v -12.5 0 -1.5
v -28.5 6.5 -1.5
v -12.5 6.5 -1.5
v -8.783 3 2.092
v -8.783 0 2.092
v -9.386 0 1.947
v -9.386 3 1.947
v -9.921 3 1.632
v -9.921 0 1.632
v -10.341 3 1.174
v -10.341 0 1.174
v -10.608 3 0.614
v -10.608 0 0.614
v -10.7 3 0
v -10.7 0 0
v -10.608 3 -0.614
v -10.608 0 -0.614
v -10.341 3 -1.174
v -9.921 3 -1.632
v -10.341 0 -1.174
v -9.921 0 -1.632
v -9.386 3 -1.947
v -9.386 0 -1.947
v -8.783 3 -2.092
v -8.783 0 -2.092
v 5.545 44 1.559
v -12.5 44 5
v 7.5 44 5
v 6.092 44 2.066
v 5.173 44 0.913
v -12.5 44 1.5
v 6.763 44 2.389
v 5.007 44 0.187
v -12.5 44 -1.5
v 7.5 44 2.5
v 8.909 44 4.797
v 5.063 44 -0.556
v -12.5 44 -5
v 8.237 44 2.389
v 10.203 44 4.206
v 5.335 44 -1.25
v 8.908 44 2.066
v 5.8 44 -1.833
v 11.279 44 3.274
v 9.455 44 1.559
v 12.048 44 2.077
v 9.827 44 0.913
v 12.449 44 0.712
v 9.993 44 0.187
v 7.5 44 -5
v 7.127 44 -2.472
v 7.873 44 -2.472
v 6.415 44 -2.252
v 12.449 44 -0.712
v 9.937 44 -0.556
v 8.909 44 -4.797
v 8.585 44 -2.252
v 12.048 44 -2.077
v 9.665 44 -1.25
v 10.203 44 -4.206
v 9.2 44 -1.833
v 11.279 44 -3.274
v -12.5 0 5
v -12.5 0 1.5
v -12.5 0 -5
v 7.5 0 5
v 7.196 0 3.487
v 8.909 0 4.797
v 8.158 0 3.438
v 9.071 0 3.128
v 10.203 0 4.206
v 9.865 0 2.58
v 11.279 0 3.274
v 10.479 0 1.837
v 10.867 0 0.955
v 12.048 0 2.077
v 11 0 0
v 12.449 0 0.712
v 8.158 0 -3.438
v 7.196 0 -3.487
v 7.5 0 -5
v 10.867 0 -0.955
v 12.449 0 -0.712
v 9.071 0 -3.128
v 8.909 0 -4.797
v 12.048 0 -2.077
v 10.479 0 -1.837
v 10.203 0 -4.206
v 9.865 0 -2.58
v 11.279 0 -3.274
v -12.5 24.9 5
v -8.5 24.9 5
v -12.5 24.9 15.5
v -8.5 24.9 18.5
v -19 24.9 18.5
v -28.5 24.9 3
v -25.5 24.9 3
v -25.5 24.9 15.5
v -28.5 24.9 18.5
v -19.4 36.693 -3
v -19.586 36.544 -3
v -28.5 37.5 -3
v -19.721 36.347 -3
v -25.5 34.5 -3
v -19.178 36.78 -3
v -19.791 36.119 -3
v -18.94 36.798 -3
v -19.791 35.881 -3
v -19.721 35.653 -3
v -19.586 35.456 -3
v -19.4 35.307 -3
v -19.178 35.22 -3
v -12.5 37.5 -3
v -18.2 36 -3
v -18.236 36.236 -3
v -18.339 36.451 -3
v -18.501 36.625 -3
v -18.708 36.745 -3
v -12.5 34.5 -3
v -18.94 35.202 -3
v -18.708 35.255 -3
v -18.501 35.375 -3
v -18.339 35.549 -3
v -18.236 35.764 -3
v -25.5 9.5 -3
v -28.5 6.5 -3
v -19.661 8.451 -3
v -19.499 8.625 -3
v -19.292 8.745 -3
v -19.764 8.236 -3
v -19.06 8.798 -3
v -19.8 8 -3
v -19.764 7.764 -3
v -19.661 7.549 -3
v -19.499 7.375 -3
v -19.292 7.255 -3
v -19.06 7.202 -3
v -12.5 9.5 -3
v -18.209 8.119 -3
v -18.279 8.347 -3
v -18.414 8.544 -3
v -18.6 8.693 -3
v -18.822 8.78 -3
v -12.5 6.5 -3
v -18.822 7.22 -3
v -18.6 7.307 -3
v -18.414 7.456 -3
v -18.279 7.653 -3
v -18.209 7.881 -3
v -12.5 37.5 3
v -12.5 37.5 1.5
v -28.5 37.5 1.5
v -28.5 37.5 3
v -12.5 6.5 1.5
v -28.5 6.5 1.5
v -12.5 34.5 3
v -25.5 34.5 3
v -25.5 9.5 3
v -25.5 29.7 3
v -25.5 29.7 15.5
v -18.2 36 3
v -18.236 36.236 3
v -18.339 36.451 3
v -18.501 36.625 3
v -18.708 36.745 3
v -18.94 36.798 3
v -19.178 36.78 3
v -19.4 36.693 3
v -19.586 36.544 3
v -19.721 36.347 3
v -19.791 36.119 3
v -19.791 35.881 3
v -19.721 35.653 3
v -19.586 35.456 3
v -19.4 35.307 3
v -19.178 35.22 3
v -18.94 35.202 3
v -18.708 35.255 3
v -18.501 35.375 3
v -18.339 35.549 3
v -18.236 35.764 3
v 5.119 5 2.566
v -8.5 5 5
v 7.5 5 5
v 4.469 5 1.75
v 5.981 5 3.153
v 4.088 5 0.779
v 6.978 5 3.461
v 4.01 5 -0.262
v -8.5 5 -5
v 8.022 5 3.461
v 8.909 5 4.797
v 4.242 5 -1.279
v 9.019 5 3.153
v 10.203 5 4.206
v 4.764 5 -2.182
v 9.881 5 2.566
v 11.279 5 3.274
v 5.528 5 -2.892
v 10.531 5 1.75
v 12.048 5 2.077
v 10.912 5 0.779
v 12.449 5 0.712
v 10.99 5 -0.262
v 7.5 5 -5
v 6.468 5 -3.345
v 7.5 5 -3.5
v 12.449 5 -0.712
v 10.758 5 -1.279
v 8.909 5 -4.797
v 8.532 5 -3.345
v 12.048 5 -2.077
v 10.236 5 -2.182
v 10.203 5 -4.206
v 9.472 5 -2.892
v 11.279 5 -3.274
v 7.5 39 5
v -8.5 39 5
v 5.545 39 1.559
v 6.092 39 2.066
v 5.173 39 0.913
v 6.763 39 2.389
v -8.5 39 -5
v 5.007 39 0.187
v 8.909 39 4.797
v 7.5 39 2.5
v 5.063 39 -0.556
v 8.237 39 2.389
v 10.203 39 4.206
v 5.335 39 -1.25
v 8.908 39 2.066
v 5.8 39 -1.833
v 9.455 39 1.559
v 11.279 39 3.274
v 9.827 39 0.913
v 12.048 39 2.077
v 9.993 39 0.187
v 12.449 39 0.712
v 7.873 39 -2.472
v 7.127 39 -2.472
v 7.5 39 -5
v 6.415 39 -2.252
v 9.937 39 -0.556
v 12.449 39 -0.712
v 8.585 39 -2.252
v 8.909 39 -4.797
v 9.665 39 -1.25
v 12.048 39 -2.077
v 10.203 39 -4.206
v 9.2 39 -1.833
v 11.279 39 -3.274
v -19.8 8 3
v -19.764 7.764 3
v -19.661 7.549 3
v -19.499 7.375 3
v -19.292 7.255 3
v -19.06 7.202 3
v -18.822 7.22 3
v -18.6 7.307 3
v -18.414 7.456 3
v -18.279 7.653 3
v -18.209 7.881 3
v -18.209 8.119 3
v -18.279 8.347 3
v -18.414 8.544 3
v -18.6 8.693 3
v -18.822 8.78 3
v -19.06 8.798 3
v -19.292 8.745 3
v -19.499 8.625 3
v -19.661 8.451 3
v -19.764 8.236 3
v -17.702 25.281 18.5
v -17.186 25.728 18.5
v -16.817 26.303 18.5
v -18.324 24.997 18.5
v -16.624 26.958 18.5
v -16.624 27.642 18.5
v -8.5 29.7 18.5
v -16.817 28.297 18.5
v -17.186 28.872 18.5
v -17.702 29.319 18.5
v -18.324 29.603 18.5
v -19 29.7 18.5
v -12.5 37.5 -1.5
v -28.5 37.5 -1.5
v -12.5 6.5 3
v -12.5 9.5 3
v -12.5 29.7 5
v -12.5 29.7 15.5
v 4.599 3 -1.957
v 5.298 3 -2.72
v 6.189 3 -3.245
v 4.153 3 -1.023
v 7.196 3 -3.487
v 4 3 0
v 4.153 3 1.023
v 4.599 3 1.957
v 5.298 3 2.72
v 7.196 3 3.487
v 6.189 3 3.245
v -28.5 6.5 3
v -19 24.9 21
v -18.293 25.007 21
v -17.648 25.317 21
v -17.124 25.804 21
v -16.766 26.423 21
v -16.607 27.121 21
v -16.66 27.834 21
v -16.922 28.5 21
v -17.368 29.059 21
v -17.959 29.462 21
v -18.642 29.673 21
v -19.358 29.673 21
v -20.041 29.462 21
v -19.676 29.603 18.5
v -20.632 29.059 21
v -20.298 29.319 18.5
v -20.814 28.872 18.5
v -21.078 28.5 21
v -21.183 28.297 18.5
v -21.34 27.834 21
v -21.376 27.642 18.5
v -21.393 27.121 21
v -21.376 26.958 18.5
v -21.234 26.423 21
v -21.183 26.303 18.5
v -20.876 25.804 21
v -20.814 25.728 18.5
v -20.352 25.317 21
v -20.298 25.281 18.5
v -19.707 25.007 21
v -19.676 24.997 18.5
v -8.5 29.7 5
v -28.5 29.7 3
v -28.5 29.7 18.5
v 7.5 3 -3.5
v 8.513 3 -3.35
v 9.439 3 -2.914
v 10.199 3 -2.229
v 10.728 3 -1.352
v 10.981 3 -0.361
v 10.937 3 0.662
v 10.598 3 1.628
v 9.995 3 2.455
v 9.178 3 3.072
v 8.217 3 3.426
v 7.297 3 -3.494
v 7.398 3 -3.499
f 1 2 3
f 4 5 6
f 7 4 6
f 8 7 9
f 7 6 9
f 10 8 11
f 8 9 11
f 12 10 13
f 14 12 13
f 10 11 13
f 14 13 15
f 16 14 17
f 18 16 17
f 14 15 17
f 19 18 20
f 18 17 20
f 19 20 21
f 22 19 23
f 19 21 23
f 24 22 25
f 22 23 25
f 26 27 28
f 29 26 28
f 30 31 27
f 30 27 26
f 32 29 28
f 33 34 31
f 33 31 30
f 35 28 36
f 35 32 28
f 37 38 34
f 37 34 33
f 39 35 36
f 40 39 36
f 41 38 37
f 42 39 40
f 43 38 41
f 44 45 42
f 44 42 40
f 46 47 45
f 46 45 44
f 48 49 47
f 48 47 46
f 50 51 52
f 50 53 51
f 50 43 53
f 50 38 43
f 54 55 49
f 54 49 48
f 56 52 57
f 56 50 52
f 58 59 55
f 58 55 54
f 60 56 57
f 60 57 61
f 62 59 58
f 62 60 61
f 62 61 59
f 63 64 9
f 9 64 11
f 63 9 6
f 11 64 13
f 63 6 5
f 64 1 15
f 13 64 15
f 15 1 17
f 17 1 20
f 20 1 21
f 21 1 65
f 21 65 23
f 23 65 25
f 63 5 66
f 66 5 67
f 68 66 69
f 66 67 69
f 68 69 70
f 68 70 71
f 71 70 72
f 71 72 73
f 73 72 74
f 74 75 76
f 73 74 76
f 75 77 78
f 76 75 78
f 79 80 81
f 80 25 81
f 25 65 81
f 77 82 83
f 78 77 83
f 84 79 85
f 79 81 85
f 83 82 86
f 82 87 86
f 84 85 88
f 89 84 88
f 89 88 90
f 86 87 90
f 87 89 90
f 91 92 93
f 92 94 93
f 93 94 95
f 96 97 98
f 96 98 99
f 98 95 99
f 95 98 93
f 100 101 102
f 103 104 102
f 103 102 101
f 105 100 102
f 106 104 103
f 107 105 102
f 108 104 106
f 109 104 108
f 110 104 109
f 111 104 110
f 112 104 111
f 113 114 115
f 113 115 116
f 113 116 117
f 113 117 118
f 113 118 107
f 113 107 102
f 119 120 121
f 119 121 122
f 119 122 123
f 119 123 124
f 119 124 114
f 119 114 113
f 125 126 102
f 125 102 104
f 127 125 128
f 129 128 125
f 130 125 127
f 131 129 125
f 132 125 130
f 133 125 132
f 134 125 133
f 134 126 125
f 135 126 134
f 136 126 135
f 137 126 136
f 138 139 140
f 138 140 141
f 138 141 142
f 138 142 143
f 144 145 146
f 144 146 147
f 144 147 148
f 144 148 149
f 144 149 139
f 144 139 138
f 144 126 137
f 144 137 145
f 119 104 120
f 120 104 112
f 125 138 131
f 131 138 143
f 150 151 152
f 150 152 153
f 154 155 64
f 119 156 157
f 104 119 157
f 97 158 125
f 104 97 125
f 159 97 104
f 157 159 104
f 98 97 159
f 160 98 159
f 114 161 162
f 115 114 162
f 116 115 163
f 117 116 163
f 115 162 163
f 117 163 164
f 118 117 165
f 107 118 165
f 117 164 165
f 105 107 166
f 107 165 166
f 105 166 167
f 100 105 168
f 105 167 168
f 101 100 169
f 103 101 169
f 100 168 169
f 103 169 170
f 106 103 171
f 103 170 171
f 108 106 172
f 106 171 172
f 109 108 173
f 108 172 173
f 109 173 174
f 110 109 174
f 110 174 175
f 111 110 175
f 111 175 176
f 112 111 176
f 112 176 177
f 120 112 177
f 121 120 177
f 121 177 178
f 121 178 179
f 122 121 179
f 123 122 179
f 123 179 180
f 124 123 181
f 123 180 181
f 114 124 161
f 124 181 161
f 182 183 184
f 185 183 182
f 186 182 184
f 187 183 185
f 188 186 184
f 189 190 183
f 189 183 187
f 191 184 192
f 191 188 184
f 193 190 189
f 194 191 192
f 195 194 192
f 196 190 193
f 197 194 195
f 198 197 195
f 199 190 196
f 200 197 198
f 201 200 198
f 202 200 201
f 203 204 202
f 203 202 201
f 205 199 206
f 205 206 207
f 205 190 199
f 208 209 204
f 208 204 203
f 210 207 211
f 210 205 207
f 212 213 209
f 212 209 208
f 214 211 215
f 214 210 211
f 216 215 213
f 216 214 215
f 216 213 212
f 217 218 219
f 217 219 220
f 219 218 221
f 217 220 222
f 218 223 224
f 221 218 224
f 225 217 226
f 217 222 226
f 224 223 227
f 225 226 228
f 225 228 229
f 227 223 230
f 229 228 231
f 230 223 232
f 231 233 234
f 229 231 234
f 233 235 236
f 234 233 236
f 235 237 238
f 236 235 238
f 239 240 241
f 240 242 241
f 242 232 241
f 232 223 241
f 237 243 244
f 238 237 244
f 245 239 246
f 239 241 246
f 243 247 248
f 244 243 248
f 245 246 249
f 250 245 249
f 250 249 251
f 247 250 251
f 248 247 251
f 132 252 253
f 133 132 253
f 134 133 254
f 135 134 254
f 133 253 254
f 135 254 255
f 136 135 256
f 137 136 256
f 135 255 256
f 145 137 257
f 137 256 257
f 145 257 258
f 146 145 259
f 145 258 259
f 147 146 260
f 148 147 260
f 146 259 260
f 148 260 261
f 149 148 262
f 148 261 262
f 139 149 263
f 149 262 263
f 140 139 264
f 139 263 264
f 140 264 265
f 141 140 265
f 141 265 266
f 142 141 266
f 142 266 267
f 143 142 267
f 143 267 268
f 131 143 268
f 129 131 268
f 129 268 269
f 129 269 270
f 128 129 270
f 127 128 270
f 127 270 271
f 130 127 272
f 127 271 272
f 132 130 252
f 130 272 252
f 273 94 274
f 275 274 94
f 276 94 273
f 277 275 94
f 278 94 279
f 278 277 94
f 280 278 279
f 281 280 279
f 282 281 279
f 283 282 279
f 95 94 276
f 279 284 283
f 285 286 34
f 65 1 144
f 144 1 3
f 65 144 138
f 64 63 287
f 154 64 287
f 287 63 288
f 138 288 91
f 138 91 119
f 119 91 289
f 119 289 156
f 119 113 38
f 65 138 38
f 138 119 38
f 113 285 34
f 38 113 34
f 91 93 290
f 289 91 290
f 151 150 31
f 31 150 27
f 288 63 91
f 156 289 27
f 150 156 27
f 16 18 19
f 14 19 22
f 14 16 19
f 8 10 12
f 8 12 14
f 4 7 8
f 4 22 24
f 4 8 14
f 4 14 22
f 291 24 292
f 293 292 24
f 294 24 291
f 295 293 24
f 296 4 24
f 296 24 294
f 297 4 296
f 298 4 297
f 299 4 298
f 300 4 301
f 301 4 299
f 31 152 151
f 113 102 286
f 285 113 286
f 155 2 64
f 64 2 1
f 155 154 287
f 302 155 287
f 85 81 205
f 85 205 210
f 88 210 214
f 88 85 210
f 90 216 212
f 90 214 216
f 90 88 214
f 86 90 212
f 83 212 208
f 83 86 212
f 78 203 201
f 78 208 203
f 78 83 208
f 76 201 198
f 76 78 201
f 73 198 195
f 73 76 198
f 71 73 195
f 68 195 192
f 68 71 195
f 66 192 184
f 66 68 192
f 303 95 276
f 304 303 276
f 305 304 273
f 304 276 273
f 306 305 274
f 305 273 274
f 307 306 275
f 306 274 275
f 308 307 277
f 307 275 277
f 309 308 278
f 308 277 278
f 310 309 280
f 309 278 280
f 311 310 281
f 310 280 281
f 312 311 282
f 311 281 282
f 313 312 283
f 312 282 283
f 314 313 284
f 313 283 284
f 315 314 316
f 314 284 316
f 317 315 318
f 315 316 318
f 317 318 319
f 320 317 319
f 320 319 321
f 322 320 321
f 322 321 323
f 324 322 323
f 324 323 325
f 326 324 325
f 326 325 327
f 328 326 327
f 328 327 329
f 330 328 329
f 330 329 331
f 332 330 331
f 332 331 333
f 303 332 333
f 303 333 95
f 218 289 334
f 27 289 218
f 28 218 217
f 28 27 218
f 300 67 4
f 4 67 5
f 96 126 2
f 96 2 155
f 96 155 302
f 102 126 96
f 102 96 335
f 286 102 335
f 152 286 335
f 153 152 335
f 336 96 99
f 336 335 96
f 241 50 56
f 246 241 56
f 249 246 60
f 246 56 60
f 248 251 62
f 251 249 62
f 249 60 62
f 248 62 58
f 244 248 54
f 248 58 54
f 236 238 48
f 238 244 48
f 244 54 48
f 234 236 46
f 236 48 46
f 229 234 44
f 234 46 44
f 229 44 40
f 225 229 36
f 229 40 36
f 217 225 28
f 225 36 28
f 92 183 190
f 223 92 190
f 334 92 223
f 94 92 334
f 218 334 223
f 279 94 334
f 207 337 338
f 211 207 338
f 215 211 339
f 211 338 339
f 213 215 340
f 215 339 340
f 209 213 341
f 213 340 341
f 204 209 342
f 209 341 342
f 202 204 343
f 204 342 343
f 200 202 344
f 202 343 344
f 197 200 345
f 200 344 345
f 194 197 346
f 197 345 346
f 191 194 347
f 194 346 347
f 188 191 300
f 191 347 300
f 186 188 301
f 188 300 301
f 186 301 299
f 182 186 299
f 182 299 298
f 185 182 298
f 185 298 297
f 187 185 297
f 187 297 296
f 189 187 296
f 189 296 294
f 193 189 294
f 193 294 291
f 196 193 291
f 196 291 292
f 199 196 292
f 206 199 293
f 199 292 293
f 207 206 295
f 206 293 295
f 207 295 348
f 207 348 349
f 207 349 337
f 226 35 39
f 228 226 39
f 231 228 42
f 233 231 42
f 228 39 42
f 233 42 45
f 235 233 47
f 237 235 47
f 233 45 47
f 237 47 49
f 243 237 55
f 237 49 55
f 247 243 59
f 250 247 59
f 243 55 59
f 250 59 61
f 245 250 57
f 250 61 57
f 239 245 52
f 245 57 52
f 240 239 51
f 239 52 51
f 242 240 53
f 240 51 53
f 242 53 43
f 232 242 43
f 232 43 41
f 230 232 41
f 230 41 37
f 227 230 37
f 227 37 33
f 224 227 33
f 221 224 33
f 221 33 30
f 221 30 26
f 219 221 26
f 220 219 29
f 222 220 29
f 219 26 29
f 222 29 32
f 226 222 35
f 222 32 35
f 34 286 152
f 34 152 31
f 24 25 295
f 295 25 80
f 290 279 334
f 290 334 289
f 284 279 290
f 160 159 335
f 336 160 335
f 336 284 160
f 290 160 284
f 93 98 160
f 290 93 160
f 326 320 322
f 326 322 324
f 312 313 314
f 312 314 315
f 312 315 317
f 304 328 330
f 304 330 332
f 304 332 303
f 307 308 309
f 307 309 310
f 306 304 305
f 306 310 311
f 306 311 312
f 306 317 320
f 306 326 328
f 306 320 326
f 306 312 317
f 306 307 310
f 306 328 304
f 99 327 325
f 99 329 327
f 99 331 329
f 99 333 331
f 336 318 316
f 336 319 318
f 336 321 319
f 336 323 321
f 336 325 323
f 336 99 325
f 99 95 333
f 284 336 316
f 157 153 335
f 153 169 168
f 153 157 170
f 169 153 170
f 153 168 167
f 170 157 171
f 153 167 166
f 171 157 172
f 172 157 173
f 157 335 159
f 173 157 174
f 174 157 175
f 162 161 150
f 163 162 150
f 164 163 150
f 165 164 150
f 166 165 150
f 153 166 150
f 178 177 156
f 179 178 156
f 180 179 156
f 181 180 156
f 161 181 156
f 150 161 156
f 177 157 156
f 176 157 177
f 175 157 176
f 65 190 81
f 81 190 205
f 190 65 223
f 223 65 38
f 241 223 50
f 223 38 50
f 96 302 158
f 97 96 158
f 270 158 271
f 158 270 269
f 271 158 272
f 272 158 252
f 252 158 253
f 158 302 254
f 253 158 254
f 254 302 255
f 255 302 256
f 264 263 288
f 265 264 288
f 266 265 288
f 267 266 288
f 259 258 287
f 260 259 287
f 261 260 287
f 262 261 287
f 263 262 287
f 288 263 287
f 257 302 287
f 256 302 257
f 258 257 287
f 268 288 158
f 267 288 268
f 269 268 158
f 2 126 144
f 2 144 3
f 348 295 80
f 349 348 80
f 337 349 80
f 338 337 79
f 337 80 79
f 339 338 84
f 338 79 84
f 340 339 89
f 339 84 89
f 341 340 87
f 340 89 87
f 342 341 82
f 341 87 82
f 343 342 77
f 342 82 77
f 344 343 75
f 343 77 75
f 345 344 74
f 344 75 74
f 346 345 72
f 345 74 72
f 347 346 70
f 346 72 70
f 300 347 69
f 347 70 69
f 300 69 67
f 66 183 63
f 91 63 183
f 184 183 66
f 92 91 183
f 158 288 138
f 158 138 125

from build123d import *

# Parameters (mm, degrees)
SKETCH2_W               = 25
SKETCH2_H               = 10
BOSS_EXTRUDE1_DEPTH     = 5
FILLET1_RADIUS          = 5
FILLET1_LENGTH          = 5
SKETCH3_W               = 4
SKETCH3_H               = 10
BOSS_EXTRUDE2_DEPTH     = 17
SKETCH12_R              = 2.5
CUT_EXTRUDE3_DEPTH      = 5
CUT_EXTRUDE4_DEPTH      = 3
SKETCH14_R              = 3.5
CUT_EXTRUDE5_DEPTH      = 2
SKETCH15_W              = 10
SKETCH15_H              = 15.5
BOSS_EXTRUDE3_DEPTH     = 16
SKETCH16_W              = 16
SKETCH16_H              = 2
CUT_EXTRUDE6_DEPTH      = 31
CUT_EXTRUDE9_DEPTH      = 54.030651514
CUT_EXTRUDE9_DEPTH_BACK = 6
SKETCH18_W              = 13
SKETCH18_H              = 25
RIB1_REACH              = 54.662
SKETCH20_WALL_W         = 124.593227798
SKETCH20_WALL_H         = 3
RIB2_REACH              = 54.662
SKETCH21_WALL_W         = 124.593227798
SKETCH21_WALL_H         = 3
SKETCH22_R              = 0.8
CUT_EXTRUDE10_DEPTH     = 6
BOSS_EXTRUDE4_DEPTH     = 15.5
SKETCH39_W              = 3
SKETCH39_H              = 4.8
BOSS_EXTRUDE5_DEPTH     = 17
SKETCH42_W              = 4
SKETCH42_H              = 4.8
BOSS_EXTRUDE6_DEPTH     = 10.5
SKETCH43_R              = 2.4
BOSS_EXTRUDE7_DEPTH     = 2.5


with BuildPart() as part:
    # Sketch2 → Boss-Extrude1 (new body)
    with BuildSketch(Plane(origin=(0, 0, 0), x_dir=(1, 0, 0), z_dir=(0, 1, 0))):
        Rectangle(SKETCH2_W, SKETCH2_H)
    extrude(amount=BOSS_EXTRUDE1_DEPTH)

    # Fillet1: full round fillet: the end face becomes a half cylinder, R = half its width
    fillet1_face = Plane((12.5, 2.5, 0), x_dir=(0, -1, 0), z_dir=(1, 0, 0))  # on the end face: x along it, z out of the body
    fillet1_slab = fillet1_face.offset(-FILLET1_RADIUS / 2) * Box(FILLET1_LENGTH, 2 * FILLET1_RADIUS, FILLET1_RADIUS, mode=Mode.PRIVATE)  # the body's end, R deep
    fillet1_round = Plane((7.5, 2.5, 0), x_dir=(1, 0, 0), z_dir=(0, -1, 0)) * Cylinder(FILLET1_RADIUS, FILLET1_LENGTH, mode=Mode.PRIVATE)  # its axis R under the face
    add(fillet1_slab - fillet1_round, mode=Mode.SUBTRACT)

    # Sketch3 → Boss-Extrude2 (add)
    with BuildSketch(Plane(origin=(0, 5, 0), x_dir=(1, 0, 0), z_dir=(0, 1, 0))):
        with Locations((-10.5, 0)):
            Rectangle(SKETCH3_W, SKETCH3_H)
    extrude(amount=BOSS_EXTRUDE2_DEPTH)

    # Mirror1: part across plane


with BuildPart() as part_1:
    add(part.part)
    add(part.part.mirror(Plane.ZX.offset(22)))

    # Sketch12 → Cut-Extrude3 (cut)
    with BuildSketch(Plane(origin=(0, 44, 0), x_dir=(1, 0, 0), z_dir=(0, 1, 0))):
        with Locations(Location((7.5, 0, 0), (0, 0, 270))):
            Circle(SKETCH12_R)
    extrude(amount=-CUT_EXTRUDE3_DEPTH, mode=Mode.SUBTRACT)

    # Sketch13 → Cut-Extrude4 (cut)
    with BuildSketch(Plane.XZ):
        with BuildLine():
            Line((7.195652174, 3.486742377), (-8.782608696, 2.092045426))
            ThreePointArc((-8.782608696, 2.092045426), (-10.7, 0), (-8.782608696, -2.092045426))
            Line((-8.782608696, -2.092045426), (7.195652174, -3.486742377))
            ThreePointArc((7.195652174, -3.486742377), (11, 0), (7.195652174, 3.486742377))
        make_face()
    extrude(amount=-CUT_EXTRUDE4_DEPTH, mode=Mode.SUBTRACT)

    # Sketch14 → Cut-Extrude5 (cut)
    with BuildSketch(Plane.XZ.offset(-3)):
        with Locations(Location((7.5, 0, 0), (0, 0, 270))):
            Circle(SKETCH14_R)
    extrude(amount=-CUT_EXTRUDE5_DEPTH, mode=Mode.SUBTRACT)

    # Sketch15 → Boss-Extrude3 (add)
    with BuildSketch(Plane.ZY.offset(12.5)):
        with Locations((0, 14.25)):
            Rectangle(SKETCH15_W, SKETCH15_H)
        with Locations((0, 29.75)):
            Rectangle(SKETCH15_W, SKETCH15_H)
    extrude(amount=BOSS_EXTRUDE3_DEPTH)

    # Sketch16 → Cut-Extrude6 (cut)
    with BuildSketch(Plane.XZ.offset(-6.5)):
        with Locations((-20.5, 4)):
            Rectangle(SKETCH16_W, SKETCH16_H)
        with Locations((-20.5, -4)):
            Rectangle(SKETCH16_W, SKETCH16_H)
    extrude(amount=-CUT_EXTRUDE6_DEPTH, mode=Mode.SUBTRACT)

    # Sketch18 → Cut-Extrude9 (cut, two sides: drawn at the far end of the back side and taken through both)
    with BuildSketch(Plane(origin=(0, 0, -3), x_dir=(-1, 0, 0), z_dir=(0, 0, -1)).offset(-CUT_EXTRUDE9_DEPTH_BACK)):
        with Locations((19, 22)):
            Rectangle(SKETCH18_W, SKETCH18_H)
    extrude(amount=CUT_EXTRUDE9_DEPTH + CUT_EXTRUDE9_DEPTH_BACK, mode=Mode.SUBTRACT)

    # Sketch20 wall → Rib1 (add, up to next)
    with BuildSketch(Plane(origin=(-20.5, 40.75, 0), x_dir=(0.926466577122, 0.376377046956, 0), z_dir=(-0.376377046956, 0.926466577122, 0)), mode=Mode.PRIVATE) as rib1_sk1:
        Rectangle(SKETCH20_WALL_W, SKETCH20_WALL_H)
    rib1_tool1 = extrude(rib1_sk1.sketch, amount=-RIB1_REACH, mode=Mode.PRIVATE) - part_1.part
    add(rib1_tool1.solids().sort_by_distance((-20.5, 40.75, 0))[0])

    # Sketch21 wall → Rib2 (add, up to next)
    with BuildSketch(Plane(origin=(-20.5, 3.25, 0), x_dir=(0.926466577122, -0.376377046956, 0), z_dir=(0.376377046956, 0.926466577122, 0)), mode=Mode.PRIVATE) as rib2_sk1:
        Rectangle(SKETCH21_WALL_W, SKETCH21_WALL_H)
    rib2_tool1 = extrude(rib2_sk1.sketch, amount=RIB2_REACH, mode=Mode.PRIVATE) - part_1.part
    add(rib2_tool1.solids().sort_by_distance((-20.5, 3.25, 0))[0])

    # Sketch22 → Cut-Extrude10 (cut)
    with BuildSketch(Plane.XY.offset(3)):
        with Locations((-19, 36)):
            Circle(SKETCH22_R)
        with Locations(Location((-19, 8, 0), (0, 0, 180))):
            Circle(SKETCH22_R)
    extrude(amount=-CUT_EXTRUDE10_DEPTH, mode=Mode.SUBTRACT)

    # Sketch38 → Boss-Extrude4 (add)
    with BuildSketch(Plane.XY.offset(3)):
        Polygon((-25.5, 27.3), (-25.5, 24.9), (-28.5, 24.9), (-28.5, 29.7), (-25.5, 29.7), align=None)
    extrude(amount=BOSS_EXTRUDE4_DEPTH)

    # Sketch39 → Boss-Extrude5 (add)
    with BuildSketch(Plane(origin=(-25.5, 0, 0), x_dir=(0, 0, -1), z_dir=(1, 0, 0))):
        with Locations((-17, 27.3)):
            Rectangle(SKETCH39_W, SKETCH39_H)
    extrude(amount=BOSS_EXTRUDE5_DEPTH)

    # Sketch42 → Boss-Extrude6 (add)
    with BuildSketch(Plane(origin=(0, 0, 15.5), x_dir=(-1, 0, 0), z_dir=(0, 0, -1))):
        with Locations((10.5, 27.3)):
            Rectangle(SKETCH42_W, SKETCH42_H)
    extrude(amount=BOSS_EXTRUDE6_DEPTH)

    # Sketch43 → Boss-Extrude7 (add)
    with BuildSketch(Plane.XY.offset(18.5)):
        with Locations(Location((-19, 27.3, 0), (0, 0, 270))):
            Circle(SKETCH43_R)
    extrude(amount=BOSS_EXTRUDE7_DEPTH)


solid = part_1.part
